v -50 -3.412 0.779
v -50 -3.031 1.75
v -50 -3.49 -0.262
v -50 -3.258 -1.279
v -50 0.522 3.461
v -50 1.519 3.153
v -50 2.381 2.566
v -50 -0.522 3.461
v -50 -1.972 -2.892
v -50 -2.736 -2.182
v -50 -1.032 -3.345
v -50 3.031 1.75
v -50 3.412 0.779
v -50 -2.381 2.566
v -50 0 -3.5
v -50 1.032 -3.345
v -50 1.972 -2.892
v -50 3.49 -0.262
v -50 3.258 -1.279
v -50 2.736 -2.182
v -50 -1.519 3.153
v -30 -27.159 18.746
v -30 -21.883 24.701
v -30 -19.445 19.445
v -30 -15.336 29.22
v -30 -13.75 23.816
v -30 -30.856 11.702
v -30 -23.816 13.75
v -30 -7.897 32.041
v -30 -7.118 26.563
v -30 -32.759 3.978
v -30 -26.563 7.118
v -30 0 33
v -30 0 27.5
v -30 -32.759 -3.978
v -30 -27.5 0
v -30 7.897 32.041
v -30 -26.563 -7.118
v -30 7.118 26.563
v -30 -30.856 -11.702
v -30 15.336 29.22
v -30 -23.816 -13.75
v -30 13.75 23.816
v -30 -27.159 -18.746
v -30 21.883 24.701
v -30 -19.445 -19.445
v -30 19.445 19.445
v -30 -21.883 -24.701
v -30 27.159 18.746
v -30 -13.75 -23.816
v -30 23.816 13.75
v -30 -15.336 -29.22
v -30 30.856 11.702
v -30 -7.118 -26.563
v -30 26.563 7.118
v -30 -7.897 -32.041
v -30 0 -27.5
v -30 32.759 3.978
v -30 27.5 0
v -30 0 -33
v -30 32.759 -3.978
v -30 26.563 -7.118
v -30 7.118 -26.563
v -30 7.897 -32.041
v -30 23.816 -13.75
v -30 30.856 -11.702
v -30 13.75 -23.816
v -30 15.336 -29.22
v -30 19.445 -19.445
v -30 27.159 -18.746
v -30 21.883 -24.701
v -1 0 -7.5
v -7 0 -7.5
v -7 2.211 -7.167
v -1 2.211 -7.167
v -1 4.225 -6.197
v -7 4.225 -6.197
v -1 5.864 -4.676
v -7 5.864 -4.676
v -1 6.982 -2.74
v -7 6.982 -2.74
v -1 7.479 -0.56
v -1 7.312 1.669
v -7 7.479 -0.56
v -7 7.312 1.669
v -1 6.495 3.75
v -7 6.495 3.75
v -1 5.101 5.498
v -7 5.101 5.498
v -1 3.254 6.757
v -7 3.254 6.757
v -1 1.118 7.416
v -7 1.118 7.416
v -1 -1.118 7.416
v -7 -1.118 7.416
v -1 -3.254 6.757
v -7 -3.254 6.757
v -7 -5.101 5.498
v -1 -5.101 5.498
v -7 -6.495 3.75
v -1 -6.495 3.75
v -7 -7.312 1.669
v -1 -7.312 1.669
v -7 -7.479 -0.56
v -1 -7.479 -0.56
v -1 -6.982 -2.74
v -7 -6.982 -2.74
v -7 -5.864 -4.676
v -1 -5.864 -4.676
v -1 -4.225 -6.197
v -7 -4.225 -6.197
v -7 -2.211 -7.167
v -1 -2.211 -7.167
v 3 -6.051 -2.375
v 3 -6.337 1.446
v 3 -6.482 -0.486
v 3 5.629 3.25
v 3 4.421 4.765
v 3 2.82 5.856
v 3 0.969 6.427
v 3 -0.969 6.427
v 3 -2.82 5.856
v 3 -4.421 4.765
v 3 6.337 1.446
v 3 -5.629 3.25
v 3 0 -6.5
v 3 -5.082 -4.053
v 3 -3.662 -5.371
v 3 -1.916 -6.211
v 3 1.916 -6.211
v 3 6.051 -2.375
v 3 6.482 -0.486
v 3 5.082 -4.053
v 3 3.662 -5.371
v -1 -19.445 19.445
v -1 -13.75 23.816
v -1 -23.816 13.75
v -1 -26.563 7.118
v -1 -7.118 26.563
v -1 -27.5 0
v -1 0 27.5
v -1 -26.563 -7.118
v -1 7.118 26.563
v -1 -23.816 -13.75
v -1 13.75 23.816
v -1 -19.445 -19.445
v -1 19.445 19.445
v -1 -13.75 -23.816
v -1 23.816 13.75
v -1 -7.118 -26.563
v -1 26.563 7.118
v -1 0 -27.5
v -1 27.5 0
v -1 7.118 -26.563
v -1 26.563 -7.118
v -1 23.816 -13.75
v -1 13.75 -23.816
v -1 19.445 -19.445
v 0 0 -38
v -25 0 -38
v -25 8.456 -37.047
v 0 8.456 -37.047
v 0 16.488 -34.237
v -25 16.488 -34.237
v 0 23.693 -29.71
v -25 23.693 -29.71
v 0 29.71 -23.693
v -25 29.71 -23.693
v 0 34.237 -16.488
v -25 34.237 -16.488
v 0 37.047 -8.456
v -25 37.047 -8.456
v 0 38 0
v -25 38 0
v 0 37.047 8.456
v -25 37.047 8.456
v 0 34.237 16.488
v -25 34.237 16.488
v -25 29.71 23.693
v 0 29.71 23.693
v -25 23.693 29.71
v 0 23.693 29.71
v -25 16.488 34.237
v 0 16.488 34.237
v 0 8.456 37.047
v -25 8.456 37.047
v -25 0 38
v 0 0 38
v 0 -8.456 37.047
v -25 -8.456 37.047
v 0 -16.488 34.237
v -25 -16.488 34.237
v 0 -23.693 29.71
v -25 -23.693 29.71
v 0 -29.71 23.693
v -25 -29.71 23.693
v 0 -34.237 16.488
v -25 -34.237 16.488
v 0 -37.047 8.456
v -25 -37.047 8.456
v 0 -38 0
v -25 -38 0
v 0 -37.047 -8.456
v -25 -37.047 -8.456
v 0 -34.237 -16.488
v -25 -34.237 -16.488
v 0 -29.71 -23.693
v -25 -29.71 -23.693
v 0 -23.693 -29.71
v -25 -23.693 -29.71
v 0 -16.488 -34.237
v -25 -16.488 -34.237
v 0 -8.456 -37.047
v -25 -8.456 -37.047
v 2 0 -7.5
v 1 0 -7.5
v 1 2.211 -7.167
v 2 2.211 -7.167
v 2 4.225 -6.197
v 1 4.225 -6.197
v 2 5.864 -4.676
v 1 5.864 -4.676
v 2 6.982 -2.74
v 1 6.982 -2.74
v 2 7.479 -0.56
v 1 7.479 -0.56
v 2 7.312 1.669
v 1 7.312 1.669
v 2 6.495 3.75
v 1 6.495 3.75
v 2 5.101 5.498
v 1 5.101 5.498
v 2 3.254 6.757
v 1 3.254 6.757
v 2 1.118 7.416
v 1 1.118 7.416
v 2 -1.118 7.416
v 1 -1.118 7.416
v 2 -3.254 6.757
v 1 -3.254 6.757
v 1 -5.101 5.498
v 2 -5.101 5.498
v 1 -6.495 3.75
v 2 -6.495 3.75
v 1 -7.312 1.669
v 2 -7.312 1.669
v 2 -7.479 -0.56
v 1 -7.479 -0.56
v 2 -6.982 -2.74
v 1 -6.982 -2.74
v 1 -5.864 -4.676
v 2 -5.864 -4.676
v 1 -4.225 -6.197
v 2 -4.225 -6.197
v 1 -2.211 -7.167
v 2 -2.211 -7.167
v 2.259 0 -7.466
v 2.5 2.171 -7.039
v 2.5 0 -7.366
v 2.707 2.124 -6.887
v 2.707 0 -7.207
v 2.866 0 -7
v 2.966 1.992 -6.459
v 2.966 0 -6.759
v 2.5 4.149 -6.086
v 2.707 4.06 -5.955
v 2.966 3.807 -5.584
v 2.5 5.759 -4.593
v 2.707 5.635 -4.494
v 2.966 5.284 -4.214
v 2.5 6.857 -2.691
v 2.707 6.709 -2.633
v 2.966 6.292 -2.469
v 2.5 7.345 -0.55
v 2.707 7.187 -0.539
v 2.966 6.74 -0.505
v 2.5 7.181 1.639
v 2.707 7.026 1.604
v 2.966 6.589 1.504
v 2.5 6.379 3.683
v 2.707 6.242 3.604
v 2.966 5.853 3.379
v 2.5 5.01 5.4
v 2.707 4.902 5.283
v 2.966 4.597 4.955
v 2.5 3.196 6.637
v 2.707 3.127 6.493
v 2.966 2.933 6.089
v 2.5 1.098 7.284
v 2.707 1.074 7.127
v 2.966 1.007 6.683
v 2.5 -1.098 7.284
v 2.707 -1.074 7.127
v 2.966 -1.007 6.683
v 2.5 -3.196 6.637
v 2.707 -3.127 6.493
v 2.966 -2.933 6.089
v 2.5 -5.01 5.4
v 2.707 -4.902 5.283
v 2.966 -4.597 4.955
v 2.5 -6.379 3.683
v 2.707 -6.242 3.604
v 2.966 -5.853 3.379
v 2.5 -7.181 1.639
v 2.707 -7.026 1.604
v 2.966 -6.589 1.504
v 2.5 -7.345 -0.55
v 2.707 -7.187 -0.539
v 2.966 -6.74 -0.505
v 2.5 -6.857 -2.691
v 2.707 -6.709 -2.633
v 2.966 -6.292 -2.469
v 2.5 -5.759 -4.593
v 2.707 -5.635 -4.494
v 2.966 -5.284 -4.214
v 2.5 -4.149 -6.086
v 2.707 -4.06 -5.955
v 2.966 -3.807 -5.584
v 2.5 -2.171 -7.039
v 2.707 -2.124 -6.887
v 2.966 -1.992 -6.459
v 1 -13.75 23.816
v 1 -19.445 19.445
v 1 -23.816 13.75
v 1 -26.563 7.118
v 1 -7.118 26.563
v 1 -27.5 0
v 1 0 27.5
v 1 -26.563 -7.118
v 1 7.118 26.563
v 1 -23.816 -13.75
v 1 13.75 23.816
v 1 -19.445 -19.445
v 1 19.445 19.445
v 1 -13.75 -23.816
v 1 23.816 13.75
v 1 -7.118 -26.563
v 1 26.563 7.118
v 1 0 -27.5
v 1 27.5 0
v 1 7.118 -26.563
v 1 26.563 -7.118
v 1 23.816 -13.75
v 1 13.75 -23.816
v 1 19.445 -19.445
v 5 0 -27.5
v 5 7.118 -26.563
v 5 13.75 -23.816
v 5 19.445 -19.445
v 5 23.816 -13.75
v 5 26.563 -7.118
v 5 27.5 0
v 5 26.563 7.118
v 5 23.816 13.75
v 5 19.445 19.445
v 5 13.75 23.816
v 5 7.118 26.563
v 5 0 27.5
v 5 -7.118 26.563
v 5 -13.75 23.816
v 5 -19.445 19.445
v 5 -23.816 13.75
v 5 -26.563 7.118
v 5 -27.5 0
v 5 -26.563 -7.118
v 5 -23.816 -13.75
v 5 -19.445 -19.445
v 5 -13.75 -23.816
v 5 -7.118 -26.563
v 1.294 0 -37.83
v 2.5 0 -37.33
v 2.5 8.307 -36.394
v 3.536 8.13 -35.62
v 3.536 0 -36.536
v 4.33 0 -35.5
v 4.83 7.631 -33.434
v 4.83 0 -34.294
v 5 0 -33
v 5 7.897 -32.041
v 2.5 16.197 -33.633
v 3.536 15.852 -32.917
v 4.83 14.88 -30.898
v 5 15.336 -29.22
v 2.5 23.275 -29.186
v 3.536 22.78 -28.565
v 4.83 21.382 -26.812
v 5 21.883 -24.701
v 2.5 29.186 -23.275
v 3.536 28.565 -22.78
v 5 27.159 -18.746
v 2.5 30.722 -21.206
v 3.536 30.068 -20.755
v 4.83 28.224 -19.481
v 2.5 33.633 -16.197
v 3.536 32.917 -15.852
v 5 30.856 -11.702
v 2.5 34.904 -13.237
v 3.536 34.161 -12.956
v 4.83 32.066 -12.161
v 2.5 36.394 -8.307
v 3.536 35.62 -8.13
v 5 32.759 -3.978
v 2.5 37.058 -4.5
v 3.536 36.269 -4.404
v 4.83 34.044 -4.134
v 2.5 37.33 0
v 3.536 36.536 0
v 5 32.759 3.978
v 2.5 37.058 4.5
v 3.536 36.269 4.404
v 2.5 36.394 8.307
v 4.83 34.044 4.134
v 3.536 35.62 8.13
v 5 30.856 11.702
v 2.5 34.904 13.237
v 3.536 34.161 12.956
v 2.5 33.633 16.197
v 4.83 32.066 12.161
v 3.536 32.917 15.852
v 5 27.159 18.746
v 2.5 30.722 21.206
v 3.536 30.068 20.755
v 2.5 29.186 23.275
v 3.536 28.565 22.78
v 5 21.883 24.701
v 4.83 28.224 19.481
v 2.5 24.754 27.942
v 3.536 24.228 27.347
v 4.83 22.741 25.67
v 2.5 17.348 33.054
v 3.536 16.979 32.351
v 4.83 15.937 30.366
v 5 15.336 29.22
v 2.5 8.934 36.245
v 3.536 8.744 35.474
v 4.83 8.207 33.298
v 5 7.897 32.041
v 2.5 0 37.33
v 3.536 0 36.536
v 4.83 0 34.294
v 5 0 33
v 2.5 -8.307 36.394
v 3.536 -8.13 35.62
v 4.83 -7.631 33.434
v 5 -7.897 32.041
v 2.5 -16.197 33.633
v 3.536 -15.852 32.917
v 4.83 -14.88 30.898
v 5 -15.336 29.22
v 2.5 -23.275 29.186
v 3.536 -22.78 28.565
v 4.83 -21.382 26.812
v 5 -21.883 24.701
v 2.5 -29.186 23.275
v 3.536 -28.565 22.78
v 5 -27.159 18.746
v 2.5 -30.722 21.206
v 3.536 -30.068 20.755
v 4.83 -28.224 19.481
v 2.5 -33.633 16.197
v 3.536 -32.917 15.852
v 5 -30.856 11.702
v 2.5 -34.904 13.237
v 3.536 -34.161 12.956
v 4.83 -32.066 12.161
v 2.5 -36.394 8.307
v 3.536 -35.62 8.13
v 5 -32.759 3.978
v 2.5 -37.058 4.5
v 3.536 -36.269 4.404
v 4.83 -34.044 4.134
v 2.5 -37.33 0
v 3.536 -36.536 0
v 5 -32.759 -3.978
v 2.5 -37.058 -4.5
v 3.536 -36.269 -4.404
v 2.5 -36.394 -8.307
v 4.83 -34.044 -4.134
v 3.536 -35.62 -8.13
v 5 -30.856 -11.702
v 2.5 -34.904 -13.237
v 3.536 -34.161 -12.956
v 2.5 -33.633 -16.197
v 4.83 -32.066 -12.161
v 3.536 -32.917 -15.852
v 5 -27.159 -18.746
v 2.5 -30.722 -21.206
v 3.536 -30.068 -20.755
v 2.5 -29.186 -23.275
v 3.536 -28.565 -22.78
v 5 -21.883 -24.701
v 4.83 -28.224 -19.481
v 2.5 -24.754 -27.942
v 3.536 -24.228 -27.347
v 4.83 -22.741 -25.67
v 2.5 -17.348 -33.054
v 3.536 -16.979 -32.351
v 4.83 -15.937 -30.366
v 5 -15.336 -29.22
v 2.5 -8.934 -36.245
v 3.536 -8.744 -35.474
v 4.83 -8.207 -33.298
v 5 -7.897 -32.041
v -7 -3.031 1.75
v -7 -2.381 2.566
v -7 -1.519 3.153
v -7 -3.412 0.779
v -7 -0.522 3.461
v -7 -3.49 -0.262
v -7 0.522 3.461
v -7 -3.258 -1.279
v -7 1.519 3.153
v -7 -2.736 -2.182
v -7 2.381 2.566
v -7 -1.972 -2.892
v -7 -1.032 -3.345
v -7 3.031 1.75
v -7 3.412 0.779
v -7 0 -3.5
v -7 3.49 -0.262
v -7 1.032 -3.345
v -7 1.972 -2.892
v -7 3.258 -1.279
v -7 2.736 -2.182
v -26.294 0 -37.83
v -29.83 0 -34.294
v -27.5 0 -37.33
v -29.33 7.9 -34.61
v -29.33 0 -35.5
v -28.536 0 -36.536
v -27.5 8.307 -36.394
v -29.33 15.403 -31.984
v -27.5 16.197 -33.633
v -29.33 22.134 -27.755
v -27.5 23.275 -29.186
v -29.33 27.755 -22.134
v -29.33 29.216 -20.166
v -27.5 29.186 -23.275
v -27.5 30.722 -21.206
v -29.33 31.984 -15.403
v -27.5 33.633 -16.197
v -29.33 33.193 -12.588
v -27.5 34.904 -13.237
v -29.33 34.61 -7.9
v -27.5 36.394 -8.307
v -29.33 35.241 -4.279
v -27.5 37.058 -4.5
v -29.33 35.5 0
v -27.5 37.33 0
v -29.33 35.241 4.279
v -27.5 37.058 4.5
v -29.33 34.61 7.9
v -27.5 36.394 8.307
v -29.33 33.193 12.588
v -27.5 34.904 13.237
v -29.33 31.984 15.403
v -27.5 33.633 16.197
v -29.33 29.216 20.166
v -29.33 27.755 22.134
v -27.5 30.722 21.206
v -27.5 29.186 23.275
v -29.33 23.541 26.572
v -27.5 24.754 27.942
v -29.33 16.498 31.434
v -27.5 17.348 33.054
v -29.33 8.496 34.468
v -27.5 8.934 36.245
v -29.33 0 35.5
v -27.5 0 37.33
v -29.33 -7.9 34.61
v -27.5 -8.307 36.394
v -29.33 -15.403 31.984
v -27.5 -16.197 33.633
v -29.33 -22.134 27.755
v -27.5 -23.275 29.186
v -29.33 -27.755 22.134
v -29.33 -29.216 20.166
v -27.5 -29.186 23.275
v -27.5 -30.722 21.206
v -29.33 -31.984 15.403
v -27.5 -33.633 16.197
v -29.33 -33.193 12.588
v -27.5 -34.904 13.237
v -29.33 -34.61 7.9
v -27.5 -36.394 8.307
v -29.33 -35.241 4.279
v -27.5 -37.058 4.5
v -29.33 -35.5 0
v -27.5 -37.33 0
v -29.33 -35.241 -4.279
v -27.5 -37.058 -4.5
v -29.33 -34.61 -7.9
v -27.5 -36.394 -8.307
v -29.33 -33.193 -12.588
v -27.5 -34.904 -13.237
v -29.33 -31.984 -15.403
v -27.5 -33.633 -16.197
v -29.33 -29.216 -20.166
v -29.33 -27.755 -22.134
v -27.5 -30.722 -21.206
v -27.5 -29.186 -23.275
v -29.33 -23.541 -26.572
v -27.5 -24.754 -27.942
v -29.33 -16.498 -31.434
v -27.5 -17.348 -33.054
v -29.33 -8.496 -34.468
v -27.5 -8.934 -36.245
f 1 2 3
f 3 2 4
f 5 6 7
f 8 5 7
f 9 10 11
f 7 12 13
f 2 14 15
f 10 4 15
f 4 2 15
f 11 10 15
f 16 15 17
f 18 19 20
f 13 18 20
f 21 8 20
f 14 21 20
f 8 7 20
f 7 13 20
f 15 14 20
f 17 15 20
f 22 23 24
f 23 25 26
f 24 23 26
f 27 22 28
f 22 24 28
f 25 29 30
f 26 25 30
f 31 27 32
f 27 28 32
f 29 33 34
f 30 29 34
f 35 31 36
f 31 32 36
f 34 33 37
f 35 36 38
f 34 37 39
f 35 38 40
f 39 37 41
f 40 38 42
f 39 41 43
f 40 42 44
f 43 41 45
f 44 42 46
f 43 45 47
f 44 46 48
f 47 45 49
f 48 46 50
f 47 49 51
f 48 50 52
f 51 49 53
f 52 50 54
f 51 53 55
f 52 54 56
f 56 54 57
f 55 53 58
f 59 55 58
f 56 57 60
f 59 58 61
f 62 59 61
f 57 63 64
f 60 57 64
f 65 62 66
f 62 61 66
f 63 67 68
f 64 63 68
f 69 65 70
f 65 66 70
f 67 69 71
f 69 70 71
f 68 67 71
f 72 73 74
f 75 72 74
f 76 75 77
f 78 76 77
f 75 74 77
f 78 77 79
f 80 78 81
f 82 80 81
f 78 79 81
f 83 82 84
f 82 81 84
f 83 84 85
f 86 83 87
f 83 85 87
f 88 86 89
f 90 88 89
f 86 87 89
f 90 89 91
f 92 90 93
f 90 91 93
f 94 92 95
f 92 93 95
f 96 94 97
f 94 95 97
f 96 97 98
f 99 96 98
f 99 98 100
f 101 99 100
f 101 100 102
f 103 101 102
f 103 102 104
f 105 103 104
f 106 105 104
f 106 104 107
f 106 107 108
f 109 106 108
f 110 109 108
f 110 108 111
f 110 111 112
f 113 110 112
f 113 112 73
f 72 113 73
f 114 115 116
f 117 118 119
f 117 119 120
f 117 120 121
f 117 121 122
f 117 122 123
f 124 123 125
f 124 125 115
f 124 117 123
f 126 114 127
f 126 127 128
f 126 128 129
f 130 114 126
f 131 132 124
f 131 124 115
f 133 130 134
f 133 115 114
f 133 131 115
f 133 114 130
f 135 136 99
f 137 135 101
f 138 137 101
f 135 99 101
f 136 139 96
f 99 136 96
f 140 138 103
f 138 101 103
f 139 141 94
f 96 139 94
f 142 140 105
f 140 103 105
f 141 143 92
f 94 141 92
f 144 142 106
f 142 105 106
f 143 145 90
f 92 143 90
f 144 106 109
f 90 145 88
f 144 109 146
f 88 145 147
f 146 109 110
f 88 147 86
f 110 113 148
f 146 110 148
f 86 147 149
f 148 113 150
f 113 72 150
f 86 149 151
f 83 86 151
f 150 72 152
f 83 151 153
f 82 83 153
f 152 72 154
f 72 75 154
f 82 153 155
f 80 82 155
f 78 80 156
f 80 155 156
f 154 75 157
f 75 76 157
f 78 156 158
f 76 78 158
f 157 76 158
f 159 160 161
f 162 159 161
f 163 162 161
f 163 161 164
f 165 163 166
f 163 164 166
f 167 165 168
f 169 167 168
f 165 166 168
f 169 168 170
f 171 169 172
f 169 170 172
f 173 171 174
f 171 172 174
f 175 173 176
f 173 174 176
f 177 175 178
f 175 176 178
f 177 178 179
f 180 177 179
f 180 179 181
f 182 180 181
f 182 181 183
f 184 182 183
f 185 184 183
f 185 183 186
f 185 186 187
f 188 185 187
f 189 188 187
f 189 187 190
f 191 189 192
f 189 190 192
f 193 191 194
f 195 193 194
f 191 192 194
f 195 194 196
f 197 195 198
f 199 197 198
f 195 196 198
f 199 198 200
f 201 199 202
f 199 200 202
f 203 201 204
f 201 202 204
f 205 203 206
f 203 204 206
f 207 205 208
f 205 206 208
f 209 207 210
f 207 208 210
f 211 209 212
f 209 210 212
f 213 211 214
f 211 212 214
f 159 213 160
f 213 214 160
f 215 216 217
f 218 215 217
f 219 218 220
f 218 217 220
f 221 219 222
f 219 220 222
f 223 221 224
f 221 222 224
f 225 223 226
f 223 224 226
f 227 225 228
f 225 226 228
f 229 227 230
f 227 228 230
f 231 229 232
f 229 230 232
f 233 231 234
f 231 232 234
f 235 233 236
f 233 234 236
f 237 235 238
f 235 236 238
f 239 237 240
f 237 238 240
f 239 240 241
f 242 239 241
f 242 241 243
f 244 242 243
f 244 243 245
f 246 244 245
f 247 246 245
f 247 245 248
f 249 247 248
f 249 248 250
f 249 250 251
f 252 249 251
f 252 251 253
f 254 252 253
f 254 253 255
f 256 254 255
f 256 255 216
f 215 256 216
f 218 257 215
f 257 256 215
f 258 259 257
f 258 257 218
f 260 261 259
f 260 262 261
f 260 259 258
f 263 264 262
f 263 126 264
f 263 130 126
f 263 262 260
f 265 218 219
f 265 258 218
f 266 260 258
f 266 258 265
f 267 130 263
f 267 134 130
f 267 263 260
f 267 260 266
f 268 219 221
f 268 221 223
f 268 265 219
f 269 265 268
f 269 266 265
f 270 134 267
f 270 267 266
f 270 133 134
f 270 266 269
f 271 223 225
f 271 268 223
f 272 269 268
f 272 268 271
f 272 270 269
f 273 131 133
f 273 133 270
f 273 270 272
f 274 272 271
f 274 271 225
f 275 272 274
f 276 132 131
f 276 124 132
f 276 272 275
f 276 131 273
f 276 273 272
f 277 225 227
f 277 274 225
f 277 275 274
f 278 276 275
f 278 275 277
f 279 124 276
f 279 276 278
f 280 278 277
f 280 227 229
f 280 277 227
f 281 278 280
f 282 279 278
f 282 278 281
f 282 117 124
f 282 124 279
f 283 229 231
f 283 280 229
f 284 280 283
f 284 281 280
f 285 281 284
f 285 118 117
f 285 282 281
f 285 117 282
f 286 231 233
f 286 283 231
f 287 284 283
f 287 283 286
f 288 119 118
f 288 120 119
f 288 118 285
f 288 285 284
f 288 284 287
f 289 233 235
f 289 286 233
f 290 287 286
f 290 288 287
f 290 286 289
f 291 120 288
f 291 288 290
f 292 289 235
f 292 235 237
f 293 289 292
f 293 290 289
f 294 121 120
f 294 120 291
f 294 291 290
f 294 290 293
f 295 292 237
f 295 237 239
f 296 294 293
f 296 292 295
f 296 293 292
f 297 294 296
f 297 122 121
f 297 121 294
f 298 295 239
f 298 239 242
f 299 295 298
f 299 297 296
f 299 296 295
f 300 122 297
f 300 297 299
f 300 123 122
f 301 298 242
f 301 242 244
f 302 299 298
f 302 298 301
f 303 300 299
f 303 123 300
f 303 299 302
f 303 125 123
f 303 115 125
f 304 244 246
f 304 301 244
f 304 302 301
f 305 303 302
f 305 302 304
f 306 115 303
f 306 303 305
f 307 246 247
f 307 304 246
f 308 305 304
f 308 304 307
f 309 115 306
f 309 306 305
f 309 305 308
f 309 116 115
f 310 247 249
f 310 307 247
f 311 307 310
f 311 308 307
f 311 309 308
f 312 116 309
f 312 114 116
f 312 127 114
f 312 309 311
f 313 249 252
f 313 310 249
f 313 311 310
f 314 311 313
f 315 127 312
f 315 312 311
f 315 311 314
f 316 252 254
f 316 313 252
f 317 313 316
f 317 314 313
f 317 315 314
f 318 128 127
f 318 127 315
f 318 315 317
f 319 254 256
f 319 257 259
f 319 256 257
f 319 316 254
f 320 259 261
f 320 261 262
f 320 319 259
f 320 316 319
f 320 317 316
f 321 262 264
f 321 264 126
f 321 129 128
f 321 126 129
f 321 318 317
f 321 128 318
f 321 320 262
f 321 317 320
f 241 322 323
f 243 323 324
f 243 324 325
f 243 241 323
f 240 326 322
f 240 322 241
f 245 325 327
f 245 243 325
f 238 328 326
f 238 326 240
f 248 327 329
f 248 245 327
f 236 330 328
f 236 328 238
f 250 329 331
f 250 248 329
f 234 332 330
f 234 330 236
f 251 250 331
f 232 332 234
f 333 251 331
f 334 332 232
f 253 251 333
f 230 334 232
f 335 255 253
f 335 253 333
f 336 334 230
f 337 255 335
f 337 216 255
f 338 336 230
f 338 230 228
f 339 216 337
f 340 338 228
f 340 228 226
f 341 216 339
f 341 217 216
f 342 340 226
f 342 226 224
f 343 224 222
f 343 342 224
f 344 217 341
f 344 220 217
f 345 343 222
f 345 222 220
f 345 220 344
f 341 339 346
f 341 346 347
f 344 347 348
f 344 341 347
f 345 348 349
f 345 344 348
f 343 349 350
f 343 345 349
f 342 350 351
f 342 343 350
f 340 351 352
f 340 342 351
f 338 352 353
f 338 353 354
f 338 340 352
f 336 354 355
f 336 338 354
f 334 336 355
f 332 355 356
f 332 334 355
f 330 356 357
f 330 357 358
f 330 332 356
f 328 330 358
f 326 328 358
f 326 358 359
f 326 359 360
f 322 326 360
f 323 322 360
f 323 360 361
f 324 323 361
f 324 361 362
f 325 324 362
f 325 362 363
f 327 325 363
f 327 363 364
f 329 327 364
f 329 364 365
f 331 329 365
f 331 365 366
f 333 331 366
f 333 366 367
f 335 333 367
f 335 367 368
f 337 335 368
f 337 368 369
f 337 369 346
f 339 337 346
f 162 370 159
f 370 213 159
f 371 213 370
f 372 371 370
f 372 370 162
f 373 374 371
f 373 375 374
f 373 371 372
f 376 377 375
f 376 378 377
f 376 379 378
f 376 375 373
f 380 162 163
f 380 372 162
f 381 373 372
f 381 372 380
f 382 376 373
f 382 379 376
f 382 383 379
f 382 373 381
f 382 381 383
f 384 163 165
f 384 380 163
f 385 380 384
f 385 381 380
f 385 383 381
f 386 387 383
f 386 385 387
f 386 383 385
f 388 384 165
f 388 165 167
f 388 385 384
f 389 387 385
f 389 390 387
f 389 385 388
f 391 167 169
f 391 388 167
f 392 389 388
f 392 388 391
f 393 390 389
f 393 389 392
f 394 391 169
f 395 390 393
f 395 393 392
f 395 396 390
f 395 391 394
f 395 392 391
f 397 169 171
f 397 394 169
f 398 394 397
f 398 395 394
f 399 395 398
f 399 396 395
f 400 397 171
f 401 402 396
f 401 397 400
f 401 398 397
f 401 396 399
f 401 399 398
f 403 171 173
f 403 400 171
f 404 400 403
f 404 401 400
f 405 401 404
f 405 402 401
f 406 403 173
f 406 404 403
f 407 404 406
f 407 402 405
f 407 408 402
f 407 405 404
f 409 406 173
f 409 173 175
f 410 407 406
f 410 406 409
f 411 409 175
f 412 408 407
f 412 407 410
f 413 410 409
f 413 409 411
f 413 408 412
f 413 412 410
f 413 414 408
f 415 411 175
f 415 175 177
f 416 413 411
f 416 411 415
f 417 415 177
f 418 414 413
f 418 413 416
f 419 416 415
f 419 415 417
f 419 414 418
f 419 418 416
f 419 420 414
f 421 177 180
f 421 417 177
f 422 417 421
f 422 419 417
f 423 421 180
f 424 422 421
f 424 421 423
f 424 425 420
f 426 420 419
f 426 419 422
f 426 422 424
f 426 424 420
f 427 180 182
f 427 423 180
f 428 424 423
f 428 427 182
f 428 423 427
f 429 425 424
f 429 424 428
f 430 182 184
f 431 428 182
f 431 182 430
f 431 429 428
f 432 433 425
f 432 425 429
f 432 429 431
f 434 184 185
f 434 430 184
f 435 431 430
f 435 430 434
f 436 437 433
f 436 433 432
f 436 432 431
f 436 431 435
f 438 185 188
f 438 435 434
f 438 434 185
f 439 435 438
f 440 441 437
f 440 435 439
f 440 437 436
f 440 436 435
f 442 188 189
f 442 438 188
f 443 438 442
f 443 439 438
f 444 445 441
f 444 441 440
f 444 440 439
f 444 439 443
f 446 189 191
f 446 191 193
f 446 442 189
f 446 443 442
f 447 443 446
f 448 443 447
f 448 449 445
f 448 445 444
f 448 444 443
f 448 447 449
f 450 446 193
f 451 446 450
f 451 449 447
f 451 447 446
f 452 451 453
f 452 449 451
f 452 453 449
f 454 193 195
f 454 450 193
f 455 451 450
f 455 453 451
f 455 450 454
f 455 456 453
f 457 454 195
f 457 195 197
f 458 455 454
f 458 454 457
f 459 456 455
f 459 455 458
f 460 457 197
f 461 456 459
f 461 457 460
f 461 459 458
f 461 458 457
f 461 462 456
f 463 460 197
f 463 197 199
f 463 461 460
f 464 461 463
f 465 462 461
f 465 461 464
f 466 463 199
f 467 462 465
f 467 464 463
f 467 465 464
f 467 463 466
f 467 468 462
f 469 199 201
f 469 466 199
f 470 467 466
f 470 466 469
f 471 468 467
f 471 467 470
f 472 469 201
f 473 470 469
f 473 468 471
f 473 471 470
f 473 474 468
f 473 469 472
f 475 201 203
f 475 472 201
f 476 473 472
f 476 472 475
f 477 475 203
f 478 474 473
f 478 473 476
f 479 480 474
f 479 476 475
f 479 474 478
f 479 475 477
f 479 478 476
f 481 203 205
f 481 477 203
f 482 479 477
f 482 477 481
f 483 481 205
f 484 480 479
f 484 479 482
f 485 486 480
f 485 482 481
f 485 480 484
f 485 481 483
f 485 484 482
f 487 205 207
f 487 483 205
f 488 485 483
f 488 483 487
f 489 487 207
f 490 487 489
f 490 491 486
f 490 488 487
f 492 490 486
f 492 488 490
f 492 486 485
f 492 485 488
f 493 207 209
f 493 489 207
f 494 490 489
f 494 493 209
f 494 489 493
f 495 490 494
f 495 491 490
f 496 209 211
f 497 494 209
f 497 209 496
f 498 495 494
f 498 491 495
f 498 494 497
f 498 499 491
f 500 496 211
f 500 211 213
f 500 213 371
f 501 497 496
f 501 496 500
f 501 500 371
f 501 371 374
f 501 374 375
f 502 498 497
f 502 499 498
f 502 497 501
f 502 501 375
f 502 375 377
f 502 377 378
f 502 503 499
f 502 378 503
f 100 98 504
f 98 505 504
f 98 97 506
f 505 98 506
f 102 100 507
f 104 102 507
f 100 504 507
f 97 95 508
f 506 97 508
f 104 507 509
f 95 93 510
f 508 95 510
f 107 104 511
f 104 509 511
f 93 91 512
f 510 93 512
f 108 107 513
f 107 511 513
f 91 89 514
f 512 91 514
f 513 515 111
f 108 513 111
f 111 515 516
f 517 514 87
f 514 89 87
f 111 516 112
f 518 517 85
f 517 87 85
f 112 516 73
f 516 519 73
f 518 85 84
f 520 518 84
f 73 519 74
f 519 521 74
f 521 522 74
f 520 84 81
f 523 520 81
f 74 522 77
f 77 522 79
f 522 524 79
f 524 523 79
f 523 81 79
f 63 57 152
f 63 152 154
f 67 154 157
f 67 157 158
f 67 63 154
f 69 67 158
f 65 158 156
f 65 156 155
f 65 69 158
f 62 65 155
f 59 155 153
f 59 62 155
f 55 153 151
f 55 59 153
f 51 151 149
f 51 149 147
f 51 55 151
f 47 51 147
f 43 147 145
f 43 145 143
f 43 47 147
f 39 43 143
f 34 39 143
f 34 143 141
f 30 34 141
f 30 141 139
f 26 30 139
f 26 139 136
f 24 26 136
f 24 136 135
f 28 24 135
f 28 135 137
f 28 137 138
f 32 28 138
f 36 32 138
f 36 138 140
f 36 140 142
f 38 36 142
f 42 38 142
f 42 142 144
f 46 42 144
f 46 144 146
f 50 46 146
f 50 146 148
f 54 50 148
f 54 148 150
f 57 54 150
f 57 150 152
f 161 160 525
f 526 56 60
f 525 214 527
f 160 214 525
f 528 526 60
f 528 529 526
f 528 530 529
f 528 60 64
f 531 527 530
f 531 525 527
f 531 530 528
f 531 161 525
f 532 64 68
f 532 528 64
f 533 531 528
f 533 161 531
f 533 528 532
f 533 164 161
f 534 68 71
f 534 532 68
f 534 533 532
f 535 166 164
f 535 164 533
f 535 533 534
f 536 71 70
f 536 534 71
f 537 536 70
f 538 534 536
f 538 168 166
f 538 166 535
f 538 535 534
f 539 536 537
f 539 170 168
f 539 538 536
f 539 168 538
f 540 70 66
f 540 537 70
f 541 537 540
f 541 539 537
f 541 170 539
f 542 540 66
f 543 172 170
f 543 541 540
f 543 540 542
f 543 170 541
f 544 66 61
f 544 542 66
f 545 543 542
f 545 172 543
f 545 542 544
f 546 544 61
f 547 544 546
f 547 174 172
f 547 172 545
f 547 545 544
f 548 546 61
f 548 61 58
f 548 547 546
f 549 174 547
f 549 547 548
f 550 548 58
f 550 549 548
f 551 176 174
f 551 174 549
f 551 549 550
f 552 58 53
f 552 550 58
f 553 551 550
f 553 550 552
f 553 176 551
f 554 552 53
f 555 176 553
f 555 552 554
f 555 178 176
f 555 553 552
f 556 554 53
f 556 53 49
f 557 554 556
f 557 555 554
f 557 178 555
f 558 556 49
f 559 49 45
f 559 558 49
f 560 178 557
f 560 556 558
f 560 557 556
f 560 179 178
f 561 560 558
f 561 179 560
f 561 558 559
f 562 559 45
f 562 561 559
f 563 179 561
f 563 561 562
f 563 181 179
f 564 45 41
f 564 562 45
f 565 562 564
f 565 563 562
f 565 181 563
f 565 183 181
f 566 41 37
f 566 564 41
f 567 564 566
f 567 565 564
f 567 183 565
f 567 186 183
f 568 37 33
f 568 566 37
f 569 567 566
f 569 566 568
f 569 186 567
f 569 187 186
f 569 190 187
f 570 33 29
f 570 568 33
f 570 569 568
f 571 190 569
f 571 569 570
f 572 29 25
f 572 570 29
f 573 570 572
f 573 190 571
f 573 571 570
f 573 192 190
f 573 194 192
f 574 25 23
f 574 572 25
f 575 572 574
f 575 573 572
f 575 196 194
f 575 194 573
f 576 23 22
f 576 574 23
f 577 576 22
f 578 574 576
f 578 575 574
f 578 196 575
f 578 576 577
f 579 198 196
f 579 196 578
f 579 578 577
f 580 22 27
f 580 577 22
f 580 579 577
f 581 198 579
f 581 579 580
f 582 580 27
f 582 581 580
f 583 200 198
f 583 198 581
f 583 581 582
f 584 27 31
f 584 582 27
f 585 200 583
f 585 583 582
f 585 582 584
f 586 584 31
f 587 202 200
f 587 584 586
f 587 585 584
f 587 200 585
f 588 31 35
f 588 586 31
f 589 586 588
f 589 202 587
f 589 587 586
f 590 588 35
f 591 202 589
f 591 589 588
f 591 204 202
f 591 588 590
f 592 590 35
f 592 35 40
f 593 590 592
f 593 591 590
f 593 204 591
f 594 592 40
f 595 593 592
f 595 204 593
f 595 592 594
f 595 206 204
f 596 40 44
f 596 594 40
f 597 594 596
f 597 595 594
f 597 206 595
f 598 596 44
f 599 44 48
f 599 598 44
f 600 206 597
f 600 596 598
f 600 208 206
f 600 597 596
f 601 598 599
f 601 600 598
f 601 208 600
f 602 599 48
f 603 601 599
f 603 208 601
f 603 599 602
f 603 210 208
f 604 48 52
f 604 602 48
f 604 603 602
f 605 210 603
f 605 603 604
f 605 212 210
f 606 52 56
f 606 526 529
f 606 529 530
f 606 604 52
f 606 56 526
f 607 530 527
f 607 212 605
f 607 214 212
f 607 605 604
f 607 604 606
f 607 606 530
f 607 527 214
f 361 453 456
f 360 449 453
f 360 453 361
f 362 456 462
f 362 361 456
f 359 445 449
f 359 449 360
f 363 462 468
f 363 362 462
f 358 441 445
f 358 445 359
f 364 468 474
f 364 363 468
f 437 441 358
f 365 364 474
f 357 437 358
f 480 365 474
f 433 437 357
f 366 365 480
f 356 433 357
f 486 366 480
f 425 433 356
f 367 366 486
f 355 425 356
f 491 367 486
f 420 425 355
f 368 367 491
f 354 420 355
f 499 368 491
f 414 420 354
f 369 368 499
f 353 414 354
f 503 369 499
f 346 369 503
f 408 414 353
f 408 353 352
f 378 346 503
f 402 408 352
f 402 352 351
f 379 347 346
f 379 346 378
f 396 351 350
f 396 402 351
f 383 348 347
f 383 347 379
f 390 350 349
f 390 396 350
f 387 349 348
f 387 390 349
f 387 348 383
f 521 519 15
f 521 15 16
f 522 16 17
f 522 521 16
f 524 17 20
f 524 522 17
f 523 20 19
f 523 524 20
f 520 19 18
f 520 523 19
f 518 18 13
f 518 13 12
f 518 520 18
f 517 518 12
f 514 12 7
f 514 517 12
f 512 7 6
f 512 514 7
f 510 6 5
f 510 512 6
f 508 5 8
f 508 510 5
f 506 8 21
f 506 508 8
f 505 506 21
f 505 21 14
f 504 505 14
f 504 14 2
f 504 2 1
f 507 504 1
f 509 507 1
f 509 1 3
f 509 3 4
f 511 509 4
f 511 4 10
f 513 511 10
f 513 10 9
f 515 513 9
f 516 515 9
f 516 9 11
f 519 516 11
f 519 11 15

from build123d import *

# Parameters (mm, degrees)
BOSS_EXTRUDE1_DEPTH      = 5
BOSS_EXTRUDE1_DEPTH_BACK = 30
SKETCH1_R                = 38
SKETCH1_R_2              = 27.5
BOSS_EXTRUDE2_DEPTH      = 3
BOSS_EXTRUDE2_DEPTH_BACK = 7
SKETCH1_3_R              = 7.5
SKETCH1_4_R              = 3.5
BOSS_EXTRUDE3_DEPTH      = 50
SKETCH1_5_R              = 27.5
SKETCH1_5_R_2            = 7.5
BOSS_EXTRUDE4_DEPTH      = 1
FILLET1_R                = 5
FILLET2_R                = 1


with BuildPart() as part:
    # Sketch1 → Boss-Extrude1 (new, two sides: drawn at the far end of the back side and taken through both)
    with BuildSketch(Plane(origin=(0, 0, 0), x_dir=(0, 0, -1), z_dir=(1, 0, 0)).offset(-BOSS_EXTRUDE1_DEPTH_BACK)):
        Circle(SKETCH1_R)
        Circle(SKETCH1_R_2, mode=Mode.SUBTRACT)
    extrude(amount=BOSS_EXTRUDE1_DEPTH + BOSS_EXTRUDE1_DEPTH_BACK)



with BuildPart() as body_2:
    # Sketch1<3> → Boss-Extrude2 (new, two sides: drawn at the far end of the back side and taken through both)
    with BuildSketch(Plane(origin=(0, 0, 0), x_dir=(0, 0, -1), z_dir=(1, 0, 0)).offset(-BOSS_EXTRUDE2_DEPTH_BACK)):
        Circle(SKETCH1_3_R)
    extrude(amount=BOSS_EXTRUDE2_DEPTH + BOSS_EXTRUDE2_DEPTH_BACK)

    # Sketch1<4> → Boss-Extrude3 (add)
    with BuildSketch(Plane(origin=(0, 0, 0), x_dir=(0, 0, -1), z_dir=(1, 0, 0))):
        Circle(SKETCH1_4_R)
    extrude(amount=-BOSS_EXTRUDE3_DEPTH)


with BuildPart() as part_1:
    add(part.part)

    add(body_2.part)  # Boss-Extrude4 merges body 2
    # Sketch1<5> → Boss-Extrude4 (add, symmetric)
    with BuildSketch(Plane(origin=(0, 0, 0), x_dir=(0, 0, -1), z_dir=(1, 0, 0))):
        Circle(SKETCH1_5_R)
        Circle(SKETCH1_5_R_2, mode=Mode.SUBTRACT)
    extrude(amount=BOSS_EXTRUDE4_DEPTH, both=True)

    # Fillet1
    fillet1_edges = [part_1.edges().sort_by_distance(p)[0] for p in [
        (5, 0, 38),
        (-30, 0, 38),
    ]]
    fillet(fillet1_edges, radius=FILLET1_R - 0.0001)  # a hair under: the kernel refuses the full size

    # Fillet2
    fillet2_edges = [part_1.edges().sort_by_distance(p)[0] for p in [
        (3, 0, 7.5),
    ]]
    fillet(fillet2_edges, radius=FILLET2_R)


solid = part_1.part
